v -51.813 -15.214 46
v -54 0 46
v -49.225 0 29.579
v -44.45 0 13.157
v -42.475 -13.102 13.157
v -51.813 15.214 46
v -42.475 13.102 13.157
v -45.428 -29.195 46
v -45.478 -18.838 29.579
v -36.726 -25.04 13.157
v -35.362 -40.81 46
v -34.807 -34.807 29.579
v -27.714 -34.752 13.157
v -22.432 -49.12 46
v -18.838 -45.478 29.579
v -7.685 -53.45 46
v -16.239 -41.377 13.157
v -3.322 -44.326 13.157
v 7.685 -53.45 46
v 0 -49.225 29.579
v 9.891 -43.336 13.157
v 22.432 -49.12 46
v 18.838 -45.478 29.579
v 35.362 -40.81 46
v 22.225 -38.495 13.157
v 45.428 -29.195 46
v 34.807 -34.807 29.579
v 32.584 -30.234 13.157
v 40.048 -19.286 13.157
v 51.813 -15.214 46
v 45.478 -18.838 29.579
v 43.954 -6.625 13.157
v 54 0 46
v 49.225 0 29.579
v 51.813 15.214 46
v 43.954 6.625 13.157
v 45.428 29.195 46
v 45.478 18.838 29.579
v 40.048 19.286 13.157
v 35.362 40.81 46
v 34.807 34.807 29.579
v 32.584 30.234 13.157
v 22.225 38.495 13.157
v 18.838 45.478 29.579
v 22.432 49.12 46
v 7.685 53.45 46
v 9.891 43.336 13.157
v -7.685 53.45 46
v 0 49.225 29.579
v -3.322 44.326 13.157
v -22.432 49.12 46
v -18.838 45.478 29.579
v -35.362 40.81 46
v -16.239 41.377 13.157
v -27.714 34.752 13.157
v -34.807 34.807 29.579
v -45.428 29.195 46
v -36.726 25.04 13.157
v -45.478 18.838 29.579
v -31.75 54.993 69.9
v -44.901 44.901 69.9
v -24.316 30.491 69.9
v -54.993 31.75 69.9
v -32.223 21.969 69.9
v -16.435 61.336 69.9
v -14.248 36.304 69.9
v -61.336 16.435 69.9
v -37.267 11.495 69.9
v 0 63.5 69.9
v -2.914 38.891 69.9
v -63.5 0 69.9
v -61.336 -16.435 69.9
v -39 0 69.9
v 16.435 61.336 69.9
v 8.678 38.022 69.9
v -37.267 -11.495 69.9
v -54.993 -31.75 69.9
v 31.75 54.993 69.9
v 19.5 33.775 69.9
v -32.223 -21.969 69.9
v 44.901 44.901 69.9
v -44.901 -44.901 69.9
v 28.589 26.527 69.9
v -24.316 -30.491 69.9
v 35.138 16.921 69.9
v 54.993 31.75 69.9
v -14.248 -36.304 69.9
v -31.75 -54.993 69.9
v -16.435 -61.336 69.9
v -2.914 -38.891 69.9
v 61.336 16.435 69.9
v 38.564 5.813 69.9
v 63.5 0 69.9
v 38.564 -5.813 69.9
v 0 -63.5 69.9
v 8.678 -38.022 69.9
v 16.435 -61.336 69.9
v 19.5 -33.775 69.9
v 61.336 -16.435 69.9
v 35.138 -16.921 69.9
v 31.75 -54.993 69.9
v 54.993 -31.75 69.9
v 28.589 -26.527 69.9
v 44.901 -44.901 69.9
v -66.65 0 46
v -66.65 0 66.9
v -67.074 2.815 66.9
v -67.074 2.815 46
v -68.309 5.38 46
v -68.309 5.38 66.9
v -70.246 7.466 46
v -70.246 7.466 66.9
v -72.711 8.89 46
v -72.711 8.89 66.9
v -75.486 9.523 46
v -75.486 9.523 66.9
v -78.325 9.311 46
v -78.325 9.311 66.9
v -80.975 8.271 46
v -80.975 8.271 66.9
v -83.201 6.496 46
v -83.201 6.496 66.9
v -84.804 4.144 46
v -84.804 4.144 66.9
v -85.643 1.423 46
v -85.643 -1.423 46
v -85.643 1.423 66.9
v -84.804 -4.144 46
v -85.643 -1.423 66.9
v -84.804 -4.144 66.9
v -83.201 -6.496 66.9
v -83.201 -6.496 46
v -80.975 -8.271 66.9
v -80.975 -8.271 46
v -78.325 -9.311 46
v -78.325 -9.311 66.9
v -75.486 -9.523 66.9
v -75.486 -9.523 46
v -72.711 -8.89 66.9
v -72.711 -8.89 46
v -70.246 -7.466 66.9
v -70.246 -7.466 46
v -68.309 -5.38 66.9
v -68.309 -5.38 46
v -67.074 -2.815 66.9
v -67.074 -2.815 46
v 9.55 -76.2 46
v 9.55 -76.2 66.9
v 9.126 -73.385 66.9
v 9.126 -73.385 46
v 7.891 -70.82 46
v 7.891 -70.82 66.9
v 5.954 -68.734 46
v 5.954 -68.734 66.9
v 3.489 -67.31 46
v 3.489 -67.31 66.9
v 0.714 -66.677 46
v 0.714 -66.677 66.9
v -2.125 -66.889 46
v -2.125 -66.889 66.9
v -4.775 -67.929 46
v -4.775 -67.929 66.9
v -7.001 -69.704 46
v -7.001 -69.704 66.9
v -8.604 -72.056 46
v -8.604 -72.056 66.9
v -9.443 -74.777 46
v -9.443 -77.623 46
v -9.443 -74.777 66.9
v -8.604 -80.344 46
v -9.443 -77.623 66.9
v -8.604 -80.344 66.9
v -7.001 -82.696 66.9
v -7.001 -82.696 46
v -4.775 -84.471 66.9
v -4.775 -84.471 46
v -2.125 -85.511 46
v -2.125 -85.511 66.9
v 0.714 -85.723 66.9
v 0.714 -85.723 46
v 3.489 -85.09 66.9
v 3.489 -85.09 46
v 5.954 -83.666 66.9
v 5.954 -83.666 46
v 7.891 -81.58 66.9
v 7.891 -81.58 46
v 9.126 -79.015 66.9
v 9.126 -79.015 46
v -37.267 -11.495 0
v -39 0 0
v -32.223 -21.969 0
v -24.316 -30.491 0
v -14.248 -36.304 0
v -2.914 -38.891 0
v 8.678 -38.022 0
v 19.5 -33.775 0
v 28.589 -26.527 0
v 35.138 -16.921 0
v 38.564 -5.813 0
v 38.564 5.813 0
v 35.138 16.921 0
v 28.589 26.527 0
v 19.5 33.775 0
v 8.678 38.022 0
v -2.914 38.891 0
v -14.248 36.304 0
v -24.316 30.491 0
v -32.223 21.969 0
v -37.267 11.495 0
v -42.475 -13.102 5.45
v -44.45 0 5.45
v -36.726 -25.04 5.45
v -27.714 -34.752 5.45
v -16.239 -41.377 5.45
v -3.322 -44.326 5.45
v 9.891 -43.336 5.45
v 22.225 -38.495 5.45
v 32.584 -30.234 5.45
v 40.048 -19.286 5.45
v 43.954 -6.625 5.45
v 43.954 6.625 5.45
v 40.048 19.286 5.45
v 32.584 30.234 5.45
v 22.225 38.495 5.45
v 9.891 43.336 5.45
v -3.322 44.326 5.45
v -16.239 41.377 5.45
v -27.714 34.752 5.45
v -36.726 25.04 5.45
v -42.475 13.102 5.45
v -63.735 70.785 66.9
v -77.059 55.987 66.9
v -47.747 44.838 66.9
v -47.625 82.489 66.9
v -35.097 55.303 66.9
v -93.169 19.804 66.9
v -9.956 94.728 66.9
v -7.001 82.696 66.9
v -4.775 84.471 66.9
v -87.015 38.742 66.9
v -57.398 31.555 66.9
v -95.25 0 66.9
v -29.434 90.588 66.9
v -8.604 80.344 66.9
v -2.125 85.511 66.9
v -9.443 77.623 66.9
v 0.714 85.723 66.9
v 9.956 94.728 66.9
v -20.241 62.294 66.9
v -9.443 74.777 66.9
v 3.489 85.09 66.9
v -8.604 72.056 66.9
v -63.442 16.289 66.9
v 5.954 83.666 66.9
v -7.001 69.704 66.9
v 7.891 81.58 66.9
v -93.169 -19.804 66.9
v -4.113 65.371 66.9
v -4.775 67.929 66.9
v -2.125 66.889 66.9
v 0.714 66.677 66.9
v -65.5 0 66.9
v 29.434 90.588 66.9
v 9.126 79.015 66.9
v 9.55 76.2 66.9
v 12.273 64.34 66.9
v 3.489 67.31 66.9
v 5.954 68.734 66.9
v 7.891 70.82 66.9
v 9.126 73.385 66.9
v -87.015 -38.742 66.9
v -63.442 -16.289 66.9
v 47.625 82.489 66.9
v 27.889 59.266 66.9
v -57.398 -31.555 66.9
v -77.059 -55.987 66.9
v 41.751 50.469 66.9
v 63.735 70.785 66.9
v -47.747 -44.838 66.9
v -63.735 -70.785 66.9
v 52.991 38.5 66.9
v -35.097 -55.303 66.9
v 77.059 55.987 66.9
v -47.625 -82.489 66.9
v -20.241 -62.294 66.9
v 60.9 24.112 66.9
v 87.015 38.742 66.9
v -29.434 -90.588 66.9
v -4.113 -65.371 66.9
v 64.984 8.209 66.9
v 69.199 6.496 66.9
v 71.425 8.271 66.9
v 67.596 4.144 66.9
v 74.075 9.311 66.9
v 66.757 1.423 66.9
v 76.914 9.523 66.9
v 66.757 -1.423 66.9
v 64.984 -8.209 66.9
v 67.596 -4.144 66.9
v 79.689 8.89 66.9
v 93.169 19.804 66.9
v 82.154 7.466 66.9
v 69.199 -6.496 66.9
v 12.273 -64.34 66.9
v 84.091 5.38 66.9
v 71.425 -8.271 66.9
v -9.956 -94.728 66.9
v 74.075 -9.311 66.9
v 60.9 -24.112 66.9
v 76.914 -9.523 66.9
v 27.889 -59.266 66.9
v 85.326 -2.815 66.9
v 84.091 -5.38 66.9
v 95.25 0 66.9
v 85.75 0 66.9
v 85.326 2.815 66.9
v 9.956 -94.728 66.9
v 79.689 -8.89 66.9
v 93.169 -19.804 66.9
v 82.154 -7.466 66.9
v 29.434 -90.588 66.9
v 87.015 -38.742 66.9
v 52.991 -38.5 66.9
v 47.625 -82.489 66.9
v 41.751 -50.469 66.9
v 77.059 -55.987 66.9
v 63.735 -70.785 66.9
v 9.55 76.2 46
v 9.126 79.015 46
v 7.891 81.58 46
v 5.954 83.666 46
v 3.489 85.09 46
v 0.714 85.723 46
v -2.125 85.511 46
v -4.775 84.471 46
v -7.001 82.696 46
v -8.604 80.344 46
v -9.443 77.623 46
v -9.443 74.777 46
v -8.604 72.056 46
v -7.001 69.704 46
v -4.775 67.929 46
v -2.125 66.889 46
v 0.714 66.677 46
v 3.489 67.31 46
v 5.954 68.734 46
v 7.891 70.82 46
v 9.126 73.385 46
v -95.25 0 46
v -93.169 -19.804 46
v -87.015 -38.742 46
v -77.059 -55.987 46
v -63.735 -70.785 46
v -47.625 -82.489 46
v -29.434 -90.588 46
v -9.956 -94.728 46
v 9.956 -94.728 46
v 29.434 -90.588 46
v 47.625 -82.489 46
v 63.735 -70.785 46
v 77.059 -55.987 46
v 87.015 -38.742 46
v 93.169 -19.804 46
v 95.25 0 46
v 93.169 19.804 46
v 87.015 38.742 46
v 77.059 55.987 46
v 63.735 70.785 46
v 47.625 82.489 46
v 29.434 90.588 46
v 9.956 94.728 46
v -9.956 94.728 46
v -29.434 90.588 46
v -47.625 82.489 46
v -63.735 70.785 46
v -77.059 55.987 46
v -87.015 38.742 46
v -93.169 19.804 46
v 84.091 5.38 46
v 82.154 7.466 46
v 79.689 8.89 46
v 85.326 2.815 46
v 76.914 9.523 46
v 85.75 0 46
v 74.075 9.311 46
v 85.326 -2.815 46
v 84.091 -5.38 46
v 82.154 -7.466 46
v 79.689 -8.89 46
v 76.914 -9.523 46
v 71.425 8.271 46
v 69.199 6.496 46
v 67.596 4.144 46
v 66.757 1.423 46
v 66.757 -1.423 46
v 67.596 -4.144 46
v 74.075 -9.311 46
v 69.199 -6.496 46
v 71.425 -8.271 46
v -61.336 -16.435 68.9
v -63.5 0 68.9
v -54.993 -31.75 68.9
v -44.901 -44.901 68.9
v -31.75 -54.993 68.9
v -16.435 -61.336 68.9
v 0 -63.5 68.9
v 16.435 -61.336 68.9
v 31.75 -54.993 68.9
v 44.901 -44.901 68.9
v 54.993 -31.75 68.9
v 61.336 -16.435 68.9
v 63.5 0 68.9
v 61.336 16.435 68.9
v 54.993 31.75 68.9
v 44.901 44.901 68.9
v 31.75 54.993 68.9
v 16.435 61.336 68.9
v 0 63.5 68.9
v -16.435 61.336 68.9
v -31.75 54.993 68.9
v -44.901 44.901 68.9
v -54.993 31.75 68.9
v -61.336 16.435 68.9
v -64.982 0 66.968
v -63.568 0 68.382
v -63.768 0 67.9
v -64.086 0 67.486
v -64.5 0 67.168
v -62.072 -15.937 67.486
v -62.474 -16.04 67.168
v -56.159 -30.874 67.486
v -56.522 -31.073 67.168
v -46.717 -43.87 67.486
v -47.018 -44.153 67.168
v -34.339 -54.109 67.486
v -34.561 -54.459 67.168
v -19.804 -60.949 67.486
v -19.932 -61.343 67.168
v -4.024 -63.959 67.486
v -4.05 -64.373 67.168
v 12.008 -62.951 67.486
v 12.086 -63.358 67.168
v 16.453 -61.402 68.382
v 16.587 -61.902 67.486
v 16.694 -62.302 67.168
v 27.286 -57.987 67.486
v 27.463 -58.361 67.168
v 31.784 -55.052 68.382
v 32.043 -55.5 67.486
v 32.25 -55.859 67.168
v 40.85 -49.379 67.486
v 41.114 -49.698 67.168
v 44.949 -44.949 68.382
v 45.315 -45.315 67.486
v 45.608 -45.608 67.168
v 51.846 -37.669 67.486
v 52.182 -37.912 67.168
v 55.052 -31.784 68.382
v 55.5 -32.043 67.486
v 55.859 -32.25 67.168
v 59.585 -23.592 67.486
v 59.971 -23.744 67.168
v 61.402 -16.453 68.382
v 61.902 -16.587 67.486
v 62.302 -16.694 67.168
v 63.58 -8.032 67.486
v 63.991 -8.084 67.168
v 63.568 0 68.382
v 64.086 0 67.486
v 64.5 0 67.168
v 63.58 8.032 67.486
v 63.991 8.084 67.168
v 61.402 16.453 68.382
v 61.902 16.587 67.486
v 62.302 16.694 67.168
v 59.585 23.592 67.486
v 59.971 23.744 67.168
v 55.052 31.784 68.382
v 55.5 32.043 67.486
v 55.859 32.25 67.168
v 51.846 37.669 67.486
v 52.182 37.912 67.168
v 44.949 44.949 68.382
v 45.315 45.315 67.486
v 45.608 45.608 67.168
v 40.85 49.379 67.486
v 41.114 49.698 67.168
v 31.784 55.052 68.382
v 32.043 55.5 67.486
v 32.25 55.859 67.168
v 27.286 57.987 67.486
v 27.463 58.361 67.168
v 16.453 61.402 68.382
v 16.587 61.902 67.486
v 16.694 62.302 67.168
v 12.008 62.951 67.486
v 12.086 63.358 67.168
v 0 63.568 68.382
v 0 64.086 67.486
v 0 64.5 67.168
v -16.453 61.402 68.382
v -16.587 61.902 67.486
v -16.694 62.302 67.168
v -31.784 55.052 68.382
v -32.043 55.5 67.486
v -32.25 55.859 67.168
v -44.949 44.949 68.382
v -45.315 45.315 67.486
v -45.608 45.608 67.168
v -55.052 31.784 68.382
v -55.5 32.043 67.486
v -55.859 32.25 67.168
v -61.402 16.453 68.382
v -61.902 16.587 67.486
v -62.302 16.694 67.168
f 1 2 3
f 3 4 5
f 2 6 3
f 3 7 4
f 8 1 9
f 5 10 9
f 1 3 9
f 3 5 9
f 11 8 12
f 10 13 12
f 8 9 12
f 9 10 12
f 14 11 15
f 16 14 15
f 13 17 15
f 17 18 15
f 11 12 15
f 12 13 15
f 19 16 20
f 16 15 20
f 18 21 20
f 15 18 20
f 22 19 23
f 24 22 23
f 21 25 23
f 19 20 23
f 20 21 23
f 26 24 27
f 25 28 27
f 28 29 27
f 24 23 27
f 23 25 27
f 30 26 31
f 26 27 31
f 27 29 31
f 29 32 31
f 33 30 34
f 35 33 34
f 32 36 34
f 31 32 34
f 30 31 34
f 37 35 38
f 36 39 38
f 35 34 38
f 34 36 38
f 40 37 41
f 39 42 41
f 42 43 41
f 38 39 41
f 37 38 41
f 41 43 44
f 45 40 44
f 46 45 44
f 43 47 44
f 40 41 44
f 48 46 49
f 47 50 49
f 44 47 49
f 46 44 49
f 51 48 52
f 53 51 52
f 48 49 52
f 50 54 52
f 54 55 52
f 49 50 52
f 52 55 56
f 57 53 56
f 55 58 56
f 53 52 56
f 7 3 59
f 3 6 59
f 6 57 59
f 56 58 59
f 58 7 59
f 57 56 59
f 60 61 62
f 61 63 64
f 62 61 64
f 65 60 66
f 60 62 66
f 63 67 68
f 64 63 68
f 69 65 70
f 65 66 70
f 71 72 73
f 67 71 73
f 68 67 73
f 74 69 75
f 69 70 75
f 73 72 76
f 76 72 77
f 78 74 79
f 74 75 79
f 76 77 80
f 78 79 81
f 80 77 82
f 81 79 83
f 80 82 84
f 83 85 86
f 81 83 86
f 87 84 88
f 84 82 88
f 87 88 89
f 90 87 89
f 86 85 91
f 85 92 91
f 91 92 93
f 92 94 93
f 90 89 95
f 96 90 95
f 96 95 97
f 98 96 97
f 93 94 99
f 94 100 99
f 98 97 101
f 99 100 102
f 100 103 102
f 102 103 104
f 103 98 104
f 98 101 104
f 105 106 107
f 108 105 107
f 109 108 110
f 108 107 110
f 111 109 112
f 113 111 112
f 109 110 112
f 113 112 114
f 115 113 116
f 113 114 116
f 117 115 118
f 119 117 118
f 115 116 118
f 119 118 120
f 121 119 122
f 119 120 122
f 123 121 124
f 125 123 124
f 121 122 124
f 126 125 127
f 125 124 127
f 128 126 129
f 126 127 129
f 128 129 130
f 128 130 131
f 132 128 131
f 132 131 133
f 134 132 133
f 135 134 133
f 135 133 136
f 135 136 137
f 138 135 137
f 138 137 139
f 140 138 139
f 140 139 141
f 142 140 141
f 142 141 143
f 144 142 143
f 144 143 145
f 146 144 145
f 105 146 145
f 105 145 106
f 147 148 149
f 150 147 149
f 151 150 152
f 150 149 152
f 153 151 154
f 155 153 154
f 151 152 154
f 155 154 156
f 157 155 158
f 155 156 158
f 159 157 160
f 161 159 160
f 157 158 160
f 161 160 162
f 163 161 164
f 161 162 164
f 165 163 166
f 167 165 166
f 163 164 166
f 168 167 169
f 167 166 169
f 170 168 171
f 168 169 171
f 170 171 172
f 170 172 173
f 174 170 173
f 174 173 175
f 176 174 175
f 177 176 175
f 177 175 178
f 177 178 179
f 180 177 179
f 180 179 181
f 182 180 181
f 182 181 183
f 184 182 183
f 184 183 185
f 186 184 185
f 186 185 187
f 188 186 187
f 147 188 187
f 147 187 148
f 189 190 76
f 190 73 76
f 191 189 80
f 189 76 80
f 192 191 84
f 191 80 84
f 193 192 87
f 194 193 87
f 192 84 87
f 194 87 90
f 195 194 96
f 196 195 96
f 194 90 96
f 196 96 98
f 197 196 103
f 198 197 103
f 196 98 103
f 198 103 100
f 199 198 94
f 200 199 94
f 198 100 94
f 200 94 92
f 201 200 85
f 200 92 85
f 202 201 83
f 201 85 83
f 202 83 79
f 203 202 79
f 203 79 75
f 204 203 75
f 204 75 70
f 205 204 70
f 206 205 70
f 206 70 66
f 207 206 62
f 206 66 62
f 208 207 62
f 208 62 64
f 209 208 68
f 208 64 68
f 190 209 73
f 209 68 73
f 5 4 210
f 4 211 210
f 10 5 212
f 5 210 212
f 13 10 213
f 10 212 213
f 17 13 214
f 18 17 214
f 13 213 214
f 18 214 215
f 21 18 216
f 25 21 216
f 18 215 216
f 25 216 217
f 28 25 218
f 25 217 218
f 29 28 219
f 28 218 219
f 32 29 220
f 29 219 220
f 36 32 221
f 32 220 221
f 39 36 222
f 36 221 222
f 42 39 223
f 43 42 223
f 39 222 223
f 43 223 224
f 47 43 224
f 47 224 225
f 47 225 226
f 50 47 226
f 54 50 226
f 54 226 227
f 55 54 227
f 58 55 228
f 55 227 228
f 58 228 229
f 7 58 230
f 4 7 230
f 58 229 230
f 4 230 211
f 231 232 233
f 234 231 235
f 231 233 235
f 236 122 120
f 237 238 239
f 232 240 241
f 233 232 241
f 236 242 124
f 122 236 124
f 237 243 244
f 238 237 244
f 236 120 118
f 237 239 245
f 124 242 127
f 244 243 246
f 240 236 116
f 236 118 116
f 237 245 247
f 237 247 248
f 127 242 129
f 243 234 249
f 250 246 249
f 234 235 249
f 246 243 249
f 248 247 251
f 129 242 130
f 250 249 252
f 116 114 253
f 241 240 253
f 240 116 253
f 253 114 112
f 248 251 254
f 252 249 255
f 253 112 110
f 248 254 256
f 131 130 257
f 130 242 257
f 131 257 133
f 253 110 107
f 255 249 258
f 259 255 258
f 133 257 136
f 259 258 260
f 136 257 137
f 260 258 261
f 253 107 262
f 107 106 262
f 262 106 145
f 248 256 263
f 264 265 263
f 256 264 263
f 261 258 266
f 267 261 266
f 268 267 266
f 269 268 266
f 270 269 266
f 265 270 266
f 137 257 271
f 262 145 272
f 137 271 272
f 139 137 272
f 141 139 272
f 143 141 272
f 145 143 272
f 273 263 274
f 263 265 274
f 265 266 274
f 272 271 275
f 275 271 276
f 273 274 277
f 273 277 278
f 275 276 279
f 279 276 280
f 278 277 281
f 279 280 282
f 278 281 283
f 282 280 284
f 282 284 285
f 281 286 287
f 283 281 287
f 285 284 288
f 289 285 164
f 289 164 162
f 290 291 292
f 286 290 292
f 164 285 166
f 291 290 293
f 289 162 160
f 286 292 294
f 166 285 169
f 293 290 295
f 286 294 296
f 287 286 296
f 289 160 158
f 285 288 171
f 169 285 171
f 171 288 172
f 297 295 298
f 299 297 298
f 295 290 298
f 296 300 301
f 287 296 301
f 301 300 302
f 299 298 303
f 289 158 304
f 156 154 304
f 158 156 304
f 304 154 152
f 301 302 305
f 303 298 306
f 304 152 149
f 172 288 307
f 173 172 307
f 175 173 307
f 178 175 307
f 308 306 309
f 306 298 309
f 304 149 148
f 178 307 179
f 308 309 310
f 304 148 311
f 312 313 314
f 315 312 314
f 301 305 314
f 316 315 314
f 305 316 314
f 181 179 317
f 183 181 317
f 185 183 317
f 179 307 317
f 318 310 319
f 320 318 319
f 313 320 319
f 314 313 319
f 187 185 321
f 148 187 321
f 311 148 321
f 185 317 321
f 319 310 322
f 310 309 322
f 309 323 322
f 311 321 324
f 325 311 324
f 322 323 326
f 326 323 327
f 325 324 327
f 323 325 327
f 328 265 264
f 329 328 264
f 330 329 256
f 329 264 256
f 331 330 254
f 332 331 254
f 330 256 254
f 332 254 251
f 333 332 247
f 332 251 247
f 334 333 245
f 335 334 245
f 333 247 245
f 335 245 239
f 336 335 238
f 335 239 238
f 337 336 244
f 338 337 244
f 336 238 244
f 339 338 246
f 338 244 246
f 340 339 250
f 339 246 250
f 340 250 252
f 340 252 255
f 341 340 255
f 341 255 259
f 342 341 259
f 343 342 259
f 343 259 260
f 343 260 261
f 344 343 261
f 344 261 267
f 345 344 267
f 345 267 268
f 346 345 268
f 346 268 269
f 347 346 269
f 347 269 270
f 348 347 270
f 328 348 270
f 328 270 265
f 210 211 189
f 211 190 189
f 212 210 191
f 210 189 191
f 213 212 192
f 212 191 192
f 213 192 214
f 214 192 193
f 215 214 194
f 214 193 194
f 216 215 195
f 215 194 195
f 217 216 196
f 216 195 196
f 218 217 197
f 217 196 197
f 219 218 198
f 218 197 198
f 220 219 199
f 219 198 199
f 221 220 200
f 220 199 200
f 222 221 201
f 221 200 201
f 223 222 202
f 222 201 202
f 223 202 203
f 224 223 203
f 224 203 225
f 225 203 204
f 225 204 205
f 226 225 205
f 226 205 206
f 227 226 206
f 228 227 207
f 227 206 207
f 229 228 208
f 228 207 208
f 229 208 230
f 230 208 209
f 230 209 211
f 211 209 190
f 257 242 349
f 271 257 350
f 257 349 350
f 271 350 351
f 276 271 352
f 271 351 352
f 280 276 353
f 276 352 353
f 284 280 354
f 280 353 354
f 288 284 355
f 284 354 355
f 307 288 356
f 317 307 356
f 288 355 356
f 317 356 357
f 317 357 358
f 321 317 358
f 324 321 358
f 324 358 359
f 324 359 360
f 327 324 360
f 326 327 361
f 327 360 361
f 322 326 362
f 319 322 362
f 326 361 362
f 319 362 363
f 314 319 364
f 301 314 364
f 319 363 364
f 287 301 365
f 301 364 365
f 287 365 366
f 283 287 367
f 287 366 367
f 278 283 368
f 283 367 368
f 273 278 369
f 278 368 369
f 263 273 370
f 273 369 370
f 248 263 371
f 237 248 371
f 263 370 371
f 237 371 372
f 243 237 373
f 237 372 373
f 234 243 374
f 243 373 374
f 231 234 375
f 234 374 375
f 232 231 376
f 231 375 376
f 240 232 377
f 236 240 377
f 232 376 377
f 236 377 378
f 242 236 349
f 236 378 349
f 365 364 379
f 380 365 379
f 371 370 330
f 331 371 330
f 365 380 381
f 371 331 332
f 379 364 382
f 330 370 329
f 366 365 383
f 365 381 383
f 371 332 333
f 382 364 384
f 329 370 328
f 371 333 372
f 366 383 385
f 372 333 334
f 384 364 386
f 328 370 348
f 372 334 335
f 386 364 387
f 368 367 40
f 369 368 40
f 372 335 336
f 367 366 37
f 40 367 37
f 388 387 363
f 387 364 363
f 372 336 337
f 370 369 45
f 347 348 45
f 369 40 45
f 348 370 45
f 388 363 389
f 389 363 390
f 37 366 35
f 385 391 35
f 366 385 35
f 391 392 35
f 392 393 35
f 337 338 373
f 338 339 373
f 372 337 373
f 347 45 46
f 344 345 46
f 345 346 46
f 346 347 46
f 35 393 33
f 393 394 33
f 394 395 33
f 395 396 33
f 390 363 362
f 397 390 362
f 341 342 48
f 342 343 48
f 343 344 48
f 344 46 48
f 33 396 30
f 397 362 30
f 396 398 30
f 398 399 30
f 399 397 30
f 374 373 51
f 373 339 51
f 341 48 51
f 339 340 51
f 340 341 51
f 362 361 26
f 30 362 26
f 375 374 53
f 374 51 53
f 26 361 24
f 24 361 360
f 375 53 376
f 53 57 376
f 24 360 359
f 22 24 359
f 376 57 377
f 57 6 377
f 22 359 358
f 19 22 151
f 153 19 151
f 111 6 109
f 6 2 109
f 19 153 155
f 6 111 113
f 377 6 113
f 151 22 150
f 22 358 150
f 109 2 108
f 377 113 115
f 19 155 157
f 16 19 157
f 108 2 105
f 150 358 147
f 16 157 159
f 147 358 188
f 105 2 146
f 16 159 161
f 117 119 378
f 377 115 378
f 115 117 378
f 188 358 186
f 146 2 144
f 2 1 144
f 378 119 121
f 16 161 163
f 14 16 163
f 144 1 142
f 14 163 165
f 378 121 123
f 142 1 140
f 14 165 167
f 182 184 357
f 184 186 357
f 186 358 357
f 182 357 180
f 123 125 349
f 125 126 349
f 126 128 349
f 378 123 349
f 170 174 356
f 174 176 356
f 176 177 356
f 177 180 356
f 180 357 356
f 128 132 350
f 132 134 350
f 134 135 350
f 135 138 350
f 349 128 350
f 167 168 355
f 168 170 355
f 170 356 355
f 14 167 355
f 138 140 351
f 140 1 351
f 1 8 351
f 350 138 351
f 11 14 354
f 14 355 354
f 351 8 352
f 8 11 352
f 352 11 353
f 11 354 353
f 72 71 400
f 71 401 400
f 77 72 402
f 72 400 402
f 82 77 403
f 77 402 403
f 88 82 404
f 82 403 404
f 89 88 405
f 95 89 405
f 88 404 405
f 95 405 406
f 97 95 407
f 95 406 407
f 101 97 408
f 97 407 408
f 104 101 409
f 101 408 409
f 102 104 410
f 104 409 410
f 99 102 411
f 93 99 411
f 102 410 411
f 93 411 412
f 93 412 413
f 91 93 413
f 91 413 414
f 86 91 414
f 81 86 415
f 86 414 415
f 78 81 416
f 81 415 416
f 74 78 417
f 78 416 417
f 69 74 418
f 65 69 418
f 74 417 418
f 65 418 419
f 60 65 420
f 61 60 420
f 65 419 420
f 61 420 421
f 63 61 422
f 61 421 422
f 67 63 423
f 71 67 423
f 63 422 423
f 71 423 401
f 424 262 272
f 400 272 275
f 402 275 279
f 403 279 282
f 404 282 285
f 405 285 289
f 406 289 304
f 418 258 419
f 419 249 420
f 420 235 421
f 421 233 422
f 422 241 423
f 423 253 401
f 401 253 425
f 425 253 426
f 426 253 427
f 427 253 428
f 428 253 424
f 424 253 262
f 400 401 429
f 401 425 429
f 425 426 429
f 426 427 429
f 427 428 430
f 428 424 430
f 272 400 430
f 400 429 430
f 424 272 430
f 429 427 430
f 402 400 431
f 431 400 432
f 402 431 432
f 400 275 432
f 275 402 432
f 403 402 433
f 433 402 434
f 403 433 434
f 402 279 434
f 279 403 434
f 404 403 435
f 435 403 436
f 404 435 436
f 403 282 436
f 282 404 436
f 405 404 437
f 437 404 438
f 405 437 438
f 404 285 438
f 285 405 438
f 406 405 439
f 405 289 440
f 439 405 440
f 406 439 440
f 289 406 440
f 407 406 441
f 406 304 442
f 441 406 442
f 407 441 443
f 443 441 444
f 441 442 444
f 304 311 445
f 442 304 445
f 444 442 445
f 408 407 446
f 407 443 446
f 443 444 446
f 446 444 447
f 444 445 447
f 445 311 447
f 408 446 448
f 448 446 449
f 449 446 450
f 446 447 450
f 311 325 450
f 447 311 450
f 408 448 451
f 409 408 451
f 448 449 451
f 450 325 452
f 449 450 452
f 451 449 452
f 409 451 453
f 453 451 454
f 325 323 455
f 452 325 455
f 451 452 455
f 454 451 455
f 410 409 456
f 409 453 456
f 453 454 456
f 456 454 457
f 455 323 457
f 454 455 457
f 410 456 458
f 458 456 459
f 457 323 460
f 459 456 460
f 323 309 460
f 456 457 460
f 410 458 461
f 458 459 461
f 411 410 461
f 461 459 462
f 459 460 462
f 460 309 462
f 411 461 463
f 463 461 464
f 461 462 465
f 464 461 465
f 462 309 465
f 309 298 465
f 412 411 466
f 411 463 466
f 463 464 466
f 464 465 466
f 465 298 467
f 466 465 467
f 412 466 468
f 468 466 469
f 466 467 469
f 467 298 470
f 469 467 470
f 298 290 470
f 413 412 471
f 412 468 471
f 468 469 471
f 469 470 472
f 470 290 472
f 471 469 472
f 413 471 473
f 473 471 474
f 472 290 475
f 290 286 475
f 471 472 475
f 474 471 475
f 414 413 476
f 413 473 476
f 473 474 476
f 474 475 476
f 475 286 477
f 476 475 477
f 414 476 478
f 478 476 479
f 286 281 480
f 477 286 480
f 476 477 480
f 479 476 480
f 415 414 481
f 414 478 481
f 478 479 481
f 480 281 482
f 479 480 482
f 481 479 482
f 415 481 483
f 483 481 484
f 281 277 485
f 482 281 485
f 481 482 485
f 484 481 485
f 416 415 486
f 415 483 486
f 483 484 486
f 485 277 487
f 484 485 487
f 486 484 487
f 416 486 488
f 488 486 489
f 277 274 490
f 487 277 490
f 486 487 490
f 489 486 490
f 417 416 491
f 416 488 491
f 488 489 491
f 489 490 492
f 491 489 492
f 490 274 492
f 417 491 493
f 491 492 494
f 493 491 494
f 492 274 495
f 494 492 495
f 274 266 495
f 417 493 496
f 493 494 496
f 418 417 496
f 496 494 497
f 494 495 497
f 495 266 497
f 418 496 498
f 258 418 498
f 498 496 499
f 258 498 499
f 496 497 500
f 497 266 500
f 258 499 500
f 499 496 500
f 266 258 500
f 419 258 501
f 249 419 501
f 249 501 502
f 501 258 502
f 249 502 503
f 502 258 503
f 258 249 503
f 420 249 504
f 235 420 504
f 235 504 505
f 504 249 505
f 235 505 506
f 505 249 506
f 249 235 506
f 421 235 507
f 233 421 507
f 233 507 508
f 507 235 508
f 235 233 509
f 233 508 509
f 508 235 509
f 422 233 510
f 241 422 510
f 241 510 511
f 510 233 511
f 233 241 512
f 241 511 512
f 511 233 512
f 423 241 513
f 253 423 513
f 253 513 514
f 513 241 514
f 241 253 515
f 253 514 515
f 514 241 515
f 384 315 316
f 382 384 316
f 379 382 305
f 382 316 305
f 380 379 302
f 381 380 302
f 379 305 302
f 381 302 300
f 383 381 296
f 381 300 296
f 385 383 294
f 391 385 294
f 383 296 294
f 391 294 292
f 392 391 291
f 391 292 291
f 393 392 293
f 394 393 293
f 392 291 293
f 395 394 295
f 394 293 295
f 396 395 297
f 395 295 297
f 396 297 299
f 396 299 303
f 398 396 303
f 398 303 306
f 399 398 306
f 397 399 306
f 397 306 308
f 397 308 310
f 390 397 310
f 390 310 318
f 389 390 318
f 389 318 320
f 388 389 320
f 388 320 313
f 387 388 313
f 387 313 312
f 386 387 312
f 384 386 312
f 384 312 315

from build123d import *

# Parameters (mm, degrees)
F2_R     = 9.55
F3_DEPTH = 66.901


with BuildPart() as f1:
    # F0 (on Front) → F1 (revolve)
    with BuildSketch(Plane.XZ):
        with BuildLine():
            Line((-44.45, 5.45), (-39, 0))
            Line((-39, 0), (-39, 69.9))
            Line((-39, 69.9), (-63.5, 69.9))
            Line((-63.5, 69.9), (-63.5, 68.9))
            ThreePointArc((-63.5, 68.9), (-64.085786, 67.485786), (-65.5, 66.9))
            Line((-65.5, 66.9), (-95.25, 66.9))
            Line((-95.25, 66.9), (-95.25, 46))
            Line((-95.25, 46), (-54, 46))
            Line((-54, 46), (-44.45, 13.157464))
            Line((-44.45, 13.157464), (-44.45, 5.45))
        make_face()
    revolve(axis=Axis((0, 0, 36.061939), (0, 0, 1)))

    # F2 (on face) → F3 (cut, through all)
    with BuildSketch(Plane.XY.offset(66.9)):
        with Locations((-76.2, 0)):
            Circle(F2_R)
        with Locations((0, -76.2)):
            Circle(F2_R)
        with Locations((76.2, 0)):
            Circle(F2_R)
        with Locations((0, 76.2)):
            Circle(F2_R)
    extrude(amount=-F3_DEPTH, mode=Mode.SUBTRACT)


solid = f1.part
